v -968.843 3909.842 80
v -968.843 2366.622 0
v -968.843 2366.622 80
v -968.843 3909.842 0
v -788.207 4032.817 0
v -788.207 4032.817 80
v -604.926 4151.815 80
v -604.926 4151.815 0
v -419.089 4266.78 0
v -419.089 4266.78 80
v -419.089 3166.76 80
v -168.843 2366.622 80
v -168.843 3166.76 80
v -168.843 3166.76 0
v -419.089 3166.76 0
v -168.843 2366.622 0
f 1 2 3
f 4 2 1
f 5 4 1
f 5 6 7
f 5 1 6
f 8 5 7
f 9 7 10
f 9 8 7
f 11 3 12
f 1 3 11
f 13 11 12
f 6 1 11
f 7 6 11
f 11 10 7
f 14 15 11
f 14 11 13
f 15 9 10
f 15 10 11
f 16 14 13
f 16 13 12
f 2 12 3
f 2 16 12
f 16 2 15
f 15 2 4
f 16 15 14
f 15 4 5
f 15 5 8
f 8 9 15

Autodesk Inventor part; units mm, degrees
ref_plane "YZ Plane" through (0, 0, 0) normal (1, 0, 0) x (0, 1, 0)
ref_plane "XZ Plane" through (0, 0, 0) normal (0, 1, 0) x (-1, 0, 0)
ref_plane "XY Plane" through (0, 0, 0) normal (0, 0, 1) x (1, 0, 0)
sketch "Sketch1" plane through (0, 0, 0) normal (0, 0, 1) x (1, 0, 0)
  line L0 (-419.0894, 3166.7598) -> (-168.8434, 3166.7598)
  line L1 (-419.0894, 4266.7805) -> (-419.0894, 3166.7598)
  arc A0 (-419.0894, 4266.7805) -> (-968.8434, 3909.8415) centre (4748.6891, -4294.4149) ccw
  line L2 (-968.8434, 2366.6217) -> (-968.8434, 3909.8415)
  line L3 (-168.8434, 2366.6217) -> (-968.8434, 2366.6217)
  line L4 (-168.8434, 3166.7598) -> (-168.8434, 2366.6217)
extrude "Extrusion1" add sketch "Sketch1" along normal blind 80
properties part number "front_wall_block03" material "Wood (Maple)"
